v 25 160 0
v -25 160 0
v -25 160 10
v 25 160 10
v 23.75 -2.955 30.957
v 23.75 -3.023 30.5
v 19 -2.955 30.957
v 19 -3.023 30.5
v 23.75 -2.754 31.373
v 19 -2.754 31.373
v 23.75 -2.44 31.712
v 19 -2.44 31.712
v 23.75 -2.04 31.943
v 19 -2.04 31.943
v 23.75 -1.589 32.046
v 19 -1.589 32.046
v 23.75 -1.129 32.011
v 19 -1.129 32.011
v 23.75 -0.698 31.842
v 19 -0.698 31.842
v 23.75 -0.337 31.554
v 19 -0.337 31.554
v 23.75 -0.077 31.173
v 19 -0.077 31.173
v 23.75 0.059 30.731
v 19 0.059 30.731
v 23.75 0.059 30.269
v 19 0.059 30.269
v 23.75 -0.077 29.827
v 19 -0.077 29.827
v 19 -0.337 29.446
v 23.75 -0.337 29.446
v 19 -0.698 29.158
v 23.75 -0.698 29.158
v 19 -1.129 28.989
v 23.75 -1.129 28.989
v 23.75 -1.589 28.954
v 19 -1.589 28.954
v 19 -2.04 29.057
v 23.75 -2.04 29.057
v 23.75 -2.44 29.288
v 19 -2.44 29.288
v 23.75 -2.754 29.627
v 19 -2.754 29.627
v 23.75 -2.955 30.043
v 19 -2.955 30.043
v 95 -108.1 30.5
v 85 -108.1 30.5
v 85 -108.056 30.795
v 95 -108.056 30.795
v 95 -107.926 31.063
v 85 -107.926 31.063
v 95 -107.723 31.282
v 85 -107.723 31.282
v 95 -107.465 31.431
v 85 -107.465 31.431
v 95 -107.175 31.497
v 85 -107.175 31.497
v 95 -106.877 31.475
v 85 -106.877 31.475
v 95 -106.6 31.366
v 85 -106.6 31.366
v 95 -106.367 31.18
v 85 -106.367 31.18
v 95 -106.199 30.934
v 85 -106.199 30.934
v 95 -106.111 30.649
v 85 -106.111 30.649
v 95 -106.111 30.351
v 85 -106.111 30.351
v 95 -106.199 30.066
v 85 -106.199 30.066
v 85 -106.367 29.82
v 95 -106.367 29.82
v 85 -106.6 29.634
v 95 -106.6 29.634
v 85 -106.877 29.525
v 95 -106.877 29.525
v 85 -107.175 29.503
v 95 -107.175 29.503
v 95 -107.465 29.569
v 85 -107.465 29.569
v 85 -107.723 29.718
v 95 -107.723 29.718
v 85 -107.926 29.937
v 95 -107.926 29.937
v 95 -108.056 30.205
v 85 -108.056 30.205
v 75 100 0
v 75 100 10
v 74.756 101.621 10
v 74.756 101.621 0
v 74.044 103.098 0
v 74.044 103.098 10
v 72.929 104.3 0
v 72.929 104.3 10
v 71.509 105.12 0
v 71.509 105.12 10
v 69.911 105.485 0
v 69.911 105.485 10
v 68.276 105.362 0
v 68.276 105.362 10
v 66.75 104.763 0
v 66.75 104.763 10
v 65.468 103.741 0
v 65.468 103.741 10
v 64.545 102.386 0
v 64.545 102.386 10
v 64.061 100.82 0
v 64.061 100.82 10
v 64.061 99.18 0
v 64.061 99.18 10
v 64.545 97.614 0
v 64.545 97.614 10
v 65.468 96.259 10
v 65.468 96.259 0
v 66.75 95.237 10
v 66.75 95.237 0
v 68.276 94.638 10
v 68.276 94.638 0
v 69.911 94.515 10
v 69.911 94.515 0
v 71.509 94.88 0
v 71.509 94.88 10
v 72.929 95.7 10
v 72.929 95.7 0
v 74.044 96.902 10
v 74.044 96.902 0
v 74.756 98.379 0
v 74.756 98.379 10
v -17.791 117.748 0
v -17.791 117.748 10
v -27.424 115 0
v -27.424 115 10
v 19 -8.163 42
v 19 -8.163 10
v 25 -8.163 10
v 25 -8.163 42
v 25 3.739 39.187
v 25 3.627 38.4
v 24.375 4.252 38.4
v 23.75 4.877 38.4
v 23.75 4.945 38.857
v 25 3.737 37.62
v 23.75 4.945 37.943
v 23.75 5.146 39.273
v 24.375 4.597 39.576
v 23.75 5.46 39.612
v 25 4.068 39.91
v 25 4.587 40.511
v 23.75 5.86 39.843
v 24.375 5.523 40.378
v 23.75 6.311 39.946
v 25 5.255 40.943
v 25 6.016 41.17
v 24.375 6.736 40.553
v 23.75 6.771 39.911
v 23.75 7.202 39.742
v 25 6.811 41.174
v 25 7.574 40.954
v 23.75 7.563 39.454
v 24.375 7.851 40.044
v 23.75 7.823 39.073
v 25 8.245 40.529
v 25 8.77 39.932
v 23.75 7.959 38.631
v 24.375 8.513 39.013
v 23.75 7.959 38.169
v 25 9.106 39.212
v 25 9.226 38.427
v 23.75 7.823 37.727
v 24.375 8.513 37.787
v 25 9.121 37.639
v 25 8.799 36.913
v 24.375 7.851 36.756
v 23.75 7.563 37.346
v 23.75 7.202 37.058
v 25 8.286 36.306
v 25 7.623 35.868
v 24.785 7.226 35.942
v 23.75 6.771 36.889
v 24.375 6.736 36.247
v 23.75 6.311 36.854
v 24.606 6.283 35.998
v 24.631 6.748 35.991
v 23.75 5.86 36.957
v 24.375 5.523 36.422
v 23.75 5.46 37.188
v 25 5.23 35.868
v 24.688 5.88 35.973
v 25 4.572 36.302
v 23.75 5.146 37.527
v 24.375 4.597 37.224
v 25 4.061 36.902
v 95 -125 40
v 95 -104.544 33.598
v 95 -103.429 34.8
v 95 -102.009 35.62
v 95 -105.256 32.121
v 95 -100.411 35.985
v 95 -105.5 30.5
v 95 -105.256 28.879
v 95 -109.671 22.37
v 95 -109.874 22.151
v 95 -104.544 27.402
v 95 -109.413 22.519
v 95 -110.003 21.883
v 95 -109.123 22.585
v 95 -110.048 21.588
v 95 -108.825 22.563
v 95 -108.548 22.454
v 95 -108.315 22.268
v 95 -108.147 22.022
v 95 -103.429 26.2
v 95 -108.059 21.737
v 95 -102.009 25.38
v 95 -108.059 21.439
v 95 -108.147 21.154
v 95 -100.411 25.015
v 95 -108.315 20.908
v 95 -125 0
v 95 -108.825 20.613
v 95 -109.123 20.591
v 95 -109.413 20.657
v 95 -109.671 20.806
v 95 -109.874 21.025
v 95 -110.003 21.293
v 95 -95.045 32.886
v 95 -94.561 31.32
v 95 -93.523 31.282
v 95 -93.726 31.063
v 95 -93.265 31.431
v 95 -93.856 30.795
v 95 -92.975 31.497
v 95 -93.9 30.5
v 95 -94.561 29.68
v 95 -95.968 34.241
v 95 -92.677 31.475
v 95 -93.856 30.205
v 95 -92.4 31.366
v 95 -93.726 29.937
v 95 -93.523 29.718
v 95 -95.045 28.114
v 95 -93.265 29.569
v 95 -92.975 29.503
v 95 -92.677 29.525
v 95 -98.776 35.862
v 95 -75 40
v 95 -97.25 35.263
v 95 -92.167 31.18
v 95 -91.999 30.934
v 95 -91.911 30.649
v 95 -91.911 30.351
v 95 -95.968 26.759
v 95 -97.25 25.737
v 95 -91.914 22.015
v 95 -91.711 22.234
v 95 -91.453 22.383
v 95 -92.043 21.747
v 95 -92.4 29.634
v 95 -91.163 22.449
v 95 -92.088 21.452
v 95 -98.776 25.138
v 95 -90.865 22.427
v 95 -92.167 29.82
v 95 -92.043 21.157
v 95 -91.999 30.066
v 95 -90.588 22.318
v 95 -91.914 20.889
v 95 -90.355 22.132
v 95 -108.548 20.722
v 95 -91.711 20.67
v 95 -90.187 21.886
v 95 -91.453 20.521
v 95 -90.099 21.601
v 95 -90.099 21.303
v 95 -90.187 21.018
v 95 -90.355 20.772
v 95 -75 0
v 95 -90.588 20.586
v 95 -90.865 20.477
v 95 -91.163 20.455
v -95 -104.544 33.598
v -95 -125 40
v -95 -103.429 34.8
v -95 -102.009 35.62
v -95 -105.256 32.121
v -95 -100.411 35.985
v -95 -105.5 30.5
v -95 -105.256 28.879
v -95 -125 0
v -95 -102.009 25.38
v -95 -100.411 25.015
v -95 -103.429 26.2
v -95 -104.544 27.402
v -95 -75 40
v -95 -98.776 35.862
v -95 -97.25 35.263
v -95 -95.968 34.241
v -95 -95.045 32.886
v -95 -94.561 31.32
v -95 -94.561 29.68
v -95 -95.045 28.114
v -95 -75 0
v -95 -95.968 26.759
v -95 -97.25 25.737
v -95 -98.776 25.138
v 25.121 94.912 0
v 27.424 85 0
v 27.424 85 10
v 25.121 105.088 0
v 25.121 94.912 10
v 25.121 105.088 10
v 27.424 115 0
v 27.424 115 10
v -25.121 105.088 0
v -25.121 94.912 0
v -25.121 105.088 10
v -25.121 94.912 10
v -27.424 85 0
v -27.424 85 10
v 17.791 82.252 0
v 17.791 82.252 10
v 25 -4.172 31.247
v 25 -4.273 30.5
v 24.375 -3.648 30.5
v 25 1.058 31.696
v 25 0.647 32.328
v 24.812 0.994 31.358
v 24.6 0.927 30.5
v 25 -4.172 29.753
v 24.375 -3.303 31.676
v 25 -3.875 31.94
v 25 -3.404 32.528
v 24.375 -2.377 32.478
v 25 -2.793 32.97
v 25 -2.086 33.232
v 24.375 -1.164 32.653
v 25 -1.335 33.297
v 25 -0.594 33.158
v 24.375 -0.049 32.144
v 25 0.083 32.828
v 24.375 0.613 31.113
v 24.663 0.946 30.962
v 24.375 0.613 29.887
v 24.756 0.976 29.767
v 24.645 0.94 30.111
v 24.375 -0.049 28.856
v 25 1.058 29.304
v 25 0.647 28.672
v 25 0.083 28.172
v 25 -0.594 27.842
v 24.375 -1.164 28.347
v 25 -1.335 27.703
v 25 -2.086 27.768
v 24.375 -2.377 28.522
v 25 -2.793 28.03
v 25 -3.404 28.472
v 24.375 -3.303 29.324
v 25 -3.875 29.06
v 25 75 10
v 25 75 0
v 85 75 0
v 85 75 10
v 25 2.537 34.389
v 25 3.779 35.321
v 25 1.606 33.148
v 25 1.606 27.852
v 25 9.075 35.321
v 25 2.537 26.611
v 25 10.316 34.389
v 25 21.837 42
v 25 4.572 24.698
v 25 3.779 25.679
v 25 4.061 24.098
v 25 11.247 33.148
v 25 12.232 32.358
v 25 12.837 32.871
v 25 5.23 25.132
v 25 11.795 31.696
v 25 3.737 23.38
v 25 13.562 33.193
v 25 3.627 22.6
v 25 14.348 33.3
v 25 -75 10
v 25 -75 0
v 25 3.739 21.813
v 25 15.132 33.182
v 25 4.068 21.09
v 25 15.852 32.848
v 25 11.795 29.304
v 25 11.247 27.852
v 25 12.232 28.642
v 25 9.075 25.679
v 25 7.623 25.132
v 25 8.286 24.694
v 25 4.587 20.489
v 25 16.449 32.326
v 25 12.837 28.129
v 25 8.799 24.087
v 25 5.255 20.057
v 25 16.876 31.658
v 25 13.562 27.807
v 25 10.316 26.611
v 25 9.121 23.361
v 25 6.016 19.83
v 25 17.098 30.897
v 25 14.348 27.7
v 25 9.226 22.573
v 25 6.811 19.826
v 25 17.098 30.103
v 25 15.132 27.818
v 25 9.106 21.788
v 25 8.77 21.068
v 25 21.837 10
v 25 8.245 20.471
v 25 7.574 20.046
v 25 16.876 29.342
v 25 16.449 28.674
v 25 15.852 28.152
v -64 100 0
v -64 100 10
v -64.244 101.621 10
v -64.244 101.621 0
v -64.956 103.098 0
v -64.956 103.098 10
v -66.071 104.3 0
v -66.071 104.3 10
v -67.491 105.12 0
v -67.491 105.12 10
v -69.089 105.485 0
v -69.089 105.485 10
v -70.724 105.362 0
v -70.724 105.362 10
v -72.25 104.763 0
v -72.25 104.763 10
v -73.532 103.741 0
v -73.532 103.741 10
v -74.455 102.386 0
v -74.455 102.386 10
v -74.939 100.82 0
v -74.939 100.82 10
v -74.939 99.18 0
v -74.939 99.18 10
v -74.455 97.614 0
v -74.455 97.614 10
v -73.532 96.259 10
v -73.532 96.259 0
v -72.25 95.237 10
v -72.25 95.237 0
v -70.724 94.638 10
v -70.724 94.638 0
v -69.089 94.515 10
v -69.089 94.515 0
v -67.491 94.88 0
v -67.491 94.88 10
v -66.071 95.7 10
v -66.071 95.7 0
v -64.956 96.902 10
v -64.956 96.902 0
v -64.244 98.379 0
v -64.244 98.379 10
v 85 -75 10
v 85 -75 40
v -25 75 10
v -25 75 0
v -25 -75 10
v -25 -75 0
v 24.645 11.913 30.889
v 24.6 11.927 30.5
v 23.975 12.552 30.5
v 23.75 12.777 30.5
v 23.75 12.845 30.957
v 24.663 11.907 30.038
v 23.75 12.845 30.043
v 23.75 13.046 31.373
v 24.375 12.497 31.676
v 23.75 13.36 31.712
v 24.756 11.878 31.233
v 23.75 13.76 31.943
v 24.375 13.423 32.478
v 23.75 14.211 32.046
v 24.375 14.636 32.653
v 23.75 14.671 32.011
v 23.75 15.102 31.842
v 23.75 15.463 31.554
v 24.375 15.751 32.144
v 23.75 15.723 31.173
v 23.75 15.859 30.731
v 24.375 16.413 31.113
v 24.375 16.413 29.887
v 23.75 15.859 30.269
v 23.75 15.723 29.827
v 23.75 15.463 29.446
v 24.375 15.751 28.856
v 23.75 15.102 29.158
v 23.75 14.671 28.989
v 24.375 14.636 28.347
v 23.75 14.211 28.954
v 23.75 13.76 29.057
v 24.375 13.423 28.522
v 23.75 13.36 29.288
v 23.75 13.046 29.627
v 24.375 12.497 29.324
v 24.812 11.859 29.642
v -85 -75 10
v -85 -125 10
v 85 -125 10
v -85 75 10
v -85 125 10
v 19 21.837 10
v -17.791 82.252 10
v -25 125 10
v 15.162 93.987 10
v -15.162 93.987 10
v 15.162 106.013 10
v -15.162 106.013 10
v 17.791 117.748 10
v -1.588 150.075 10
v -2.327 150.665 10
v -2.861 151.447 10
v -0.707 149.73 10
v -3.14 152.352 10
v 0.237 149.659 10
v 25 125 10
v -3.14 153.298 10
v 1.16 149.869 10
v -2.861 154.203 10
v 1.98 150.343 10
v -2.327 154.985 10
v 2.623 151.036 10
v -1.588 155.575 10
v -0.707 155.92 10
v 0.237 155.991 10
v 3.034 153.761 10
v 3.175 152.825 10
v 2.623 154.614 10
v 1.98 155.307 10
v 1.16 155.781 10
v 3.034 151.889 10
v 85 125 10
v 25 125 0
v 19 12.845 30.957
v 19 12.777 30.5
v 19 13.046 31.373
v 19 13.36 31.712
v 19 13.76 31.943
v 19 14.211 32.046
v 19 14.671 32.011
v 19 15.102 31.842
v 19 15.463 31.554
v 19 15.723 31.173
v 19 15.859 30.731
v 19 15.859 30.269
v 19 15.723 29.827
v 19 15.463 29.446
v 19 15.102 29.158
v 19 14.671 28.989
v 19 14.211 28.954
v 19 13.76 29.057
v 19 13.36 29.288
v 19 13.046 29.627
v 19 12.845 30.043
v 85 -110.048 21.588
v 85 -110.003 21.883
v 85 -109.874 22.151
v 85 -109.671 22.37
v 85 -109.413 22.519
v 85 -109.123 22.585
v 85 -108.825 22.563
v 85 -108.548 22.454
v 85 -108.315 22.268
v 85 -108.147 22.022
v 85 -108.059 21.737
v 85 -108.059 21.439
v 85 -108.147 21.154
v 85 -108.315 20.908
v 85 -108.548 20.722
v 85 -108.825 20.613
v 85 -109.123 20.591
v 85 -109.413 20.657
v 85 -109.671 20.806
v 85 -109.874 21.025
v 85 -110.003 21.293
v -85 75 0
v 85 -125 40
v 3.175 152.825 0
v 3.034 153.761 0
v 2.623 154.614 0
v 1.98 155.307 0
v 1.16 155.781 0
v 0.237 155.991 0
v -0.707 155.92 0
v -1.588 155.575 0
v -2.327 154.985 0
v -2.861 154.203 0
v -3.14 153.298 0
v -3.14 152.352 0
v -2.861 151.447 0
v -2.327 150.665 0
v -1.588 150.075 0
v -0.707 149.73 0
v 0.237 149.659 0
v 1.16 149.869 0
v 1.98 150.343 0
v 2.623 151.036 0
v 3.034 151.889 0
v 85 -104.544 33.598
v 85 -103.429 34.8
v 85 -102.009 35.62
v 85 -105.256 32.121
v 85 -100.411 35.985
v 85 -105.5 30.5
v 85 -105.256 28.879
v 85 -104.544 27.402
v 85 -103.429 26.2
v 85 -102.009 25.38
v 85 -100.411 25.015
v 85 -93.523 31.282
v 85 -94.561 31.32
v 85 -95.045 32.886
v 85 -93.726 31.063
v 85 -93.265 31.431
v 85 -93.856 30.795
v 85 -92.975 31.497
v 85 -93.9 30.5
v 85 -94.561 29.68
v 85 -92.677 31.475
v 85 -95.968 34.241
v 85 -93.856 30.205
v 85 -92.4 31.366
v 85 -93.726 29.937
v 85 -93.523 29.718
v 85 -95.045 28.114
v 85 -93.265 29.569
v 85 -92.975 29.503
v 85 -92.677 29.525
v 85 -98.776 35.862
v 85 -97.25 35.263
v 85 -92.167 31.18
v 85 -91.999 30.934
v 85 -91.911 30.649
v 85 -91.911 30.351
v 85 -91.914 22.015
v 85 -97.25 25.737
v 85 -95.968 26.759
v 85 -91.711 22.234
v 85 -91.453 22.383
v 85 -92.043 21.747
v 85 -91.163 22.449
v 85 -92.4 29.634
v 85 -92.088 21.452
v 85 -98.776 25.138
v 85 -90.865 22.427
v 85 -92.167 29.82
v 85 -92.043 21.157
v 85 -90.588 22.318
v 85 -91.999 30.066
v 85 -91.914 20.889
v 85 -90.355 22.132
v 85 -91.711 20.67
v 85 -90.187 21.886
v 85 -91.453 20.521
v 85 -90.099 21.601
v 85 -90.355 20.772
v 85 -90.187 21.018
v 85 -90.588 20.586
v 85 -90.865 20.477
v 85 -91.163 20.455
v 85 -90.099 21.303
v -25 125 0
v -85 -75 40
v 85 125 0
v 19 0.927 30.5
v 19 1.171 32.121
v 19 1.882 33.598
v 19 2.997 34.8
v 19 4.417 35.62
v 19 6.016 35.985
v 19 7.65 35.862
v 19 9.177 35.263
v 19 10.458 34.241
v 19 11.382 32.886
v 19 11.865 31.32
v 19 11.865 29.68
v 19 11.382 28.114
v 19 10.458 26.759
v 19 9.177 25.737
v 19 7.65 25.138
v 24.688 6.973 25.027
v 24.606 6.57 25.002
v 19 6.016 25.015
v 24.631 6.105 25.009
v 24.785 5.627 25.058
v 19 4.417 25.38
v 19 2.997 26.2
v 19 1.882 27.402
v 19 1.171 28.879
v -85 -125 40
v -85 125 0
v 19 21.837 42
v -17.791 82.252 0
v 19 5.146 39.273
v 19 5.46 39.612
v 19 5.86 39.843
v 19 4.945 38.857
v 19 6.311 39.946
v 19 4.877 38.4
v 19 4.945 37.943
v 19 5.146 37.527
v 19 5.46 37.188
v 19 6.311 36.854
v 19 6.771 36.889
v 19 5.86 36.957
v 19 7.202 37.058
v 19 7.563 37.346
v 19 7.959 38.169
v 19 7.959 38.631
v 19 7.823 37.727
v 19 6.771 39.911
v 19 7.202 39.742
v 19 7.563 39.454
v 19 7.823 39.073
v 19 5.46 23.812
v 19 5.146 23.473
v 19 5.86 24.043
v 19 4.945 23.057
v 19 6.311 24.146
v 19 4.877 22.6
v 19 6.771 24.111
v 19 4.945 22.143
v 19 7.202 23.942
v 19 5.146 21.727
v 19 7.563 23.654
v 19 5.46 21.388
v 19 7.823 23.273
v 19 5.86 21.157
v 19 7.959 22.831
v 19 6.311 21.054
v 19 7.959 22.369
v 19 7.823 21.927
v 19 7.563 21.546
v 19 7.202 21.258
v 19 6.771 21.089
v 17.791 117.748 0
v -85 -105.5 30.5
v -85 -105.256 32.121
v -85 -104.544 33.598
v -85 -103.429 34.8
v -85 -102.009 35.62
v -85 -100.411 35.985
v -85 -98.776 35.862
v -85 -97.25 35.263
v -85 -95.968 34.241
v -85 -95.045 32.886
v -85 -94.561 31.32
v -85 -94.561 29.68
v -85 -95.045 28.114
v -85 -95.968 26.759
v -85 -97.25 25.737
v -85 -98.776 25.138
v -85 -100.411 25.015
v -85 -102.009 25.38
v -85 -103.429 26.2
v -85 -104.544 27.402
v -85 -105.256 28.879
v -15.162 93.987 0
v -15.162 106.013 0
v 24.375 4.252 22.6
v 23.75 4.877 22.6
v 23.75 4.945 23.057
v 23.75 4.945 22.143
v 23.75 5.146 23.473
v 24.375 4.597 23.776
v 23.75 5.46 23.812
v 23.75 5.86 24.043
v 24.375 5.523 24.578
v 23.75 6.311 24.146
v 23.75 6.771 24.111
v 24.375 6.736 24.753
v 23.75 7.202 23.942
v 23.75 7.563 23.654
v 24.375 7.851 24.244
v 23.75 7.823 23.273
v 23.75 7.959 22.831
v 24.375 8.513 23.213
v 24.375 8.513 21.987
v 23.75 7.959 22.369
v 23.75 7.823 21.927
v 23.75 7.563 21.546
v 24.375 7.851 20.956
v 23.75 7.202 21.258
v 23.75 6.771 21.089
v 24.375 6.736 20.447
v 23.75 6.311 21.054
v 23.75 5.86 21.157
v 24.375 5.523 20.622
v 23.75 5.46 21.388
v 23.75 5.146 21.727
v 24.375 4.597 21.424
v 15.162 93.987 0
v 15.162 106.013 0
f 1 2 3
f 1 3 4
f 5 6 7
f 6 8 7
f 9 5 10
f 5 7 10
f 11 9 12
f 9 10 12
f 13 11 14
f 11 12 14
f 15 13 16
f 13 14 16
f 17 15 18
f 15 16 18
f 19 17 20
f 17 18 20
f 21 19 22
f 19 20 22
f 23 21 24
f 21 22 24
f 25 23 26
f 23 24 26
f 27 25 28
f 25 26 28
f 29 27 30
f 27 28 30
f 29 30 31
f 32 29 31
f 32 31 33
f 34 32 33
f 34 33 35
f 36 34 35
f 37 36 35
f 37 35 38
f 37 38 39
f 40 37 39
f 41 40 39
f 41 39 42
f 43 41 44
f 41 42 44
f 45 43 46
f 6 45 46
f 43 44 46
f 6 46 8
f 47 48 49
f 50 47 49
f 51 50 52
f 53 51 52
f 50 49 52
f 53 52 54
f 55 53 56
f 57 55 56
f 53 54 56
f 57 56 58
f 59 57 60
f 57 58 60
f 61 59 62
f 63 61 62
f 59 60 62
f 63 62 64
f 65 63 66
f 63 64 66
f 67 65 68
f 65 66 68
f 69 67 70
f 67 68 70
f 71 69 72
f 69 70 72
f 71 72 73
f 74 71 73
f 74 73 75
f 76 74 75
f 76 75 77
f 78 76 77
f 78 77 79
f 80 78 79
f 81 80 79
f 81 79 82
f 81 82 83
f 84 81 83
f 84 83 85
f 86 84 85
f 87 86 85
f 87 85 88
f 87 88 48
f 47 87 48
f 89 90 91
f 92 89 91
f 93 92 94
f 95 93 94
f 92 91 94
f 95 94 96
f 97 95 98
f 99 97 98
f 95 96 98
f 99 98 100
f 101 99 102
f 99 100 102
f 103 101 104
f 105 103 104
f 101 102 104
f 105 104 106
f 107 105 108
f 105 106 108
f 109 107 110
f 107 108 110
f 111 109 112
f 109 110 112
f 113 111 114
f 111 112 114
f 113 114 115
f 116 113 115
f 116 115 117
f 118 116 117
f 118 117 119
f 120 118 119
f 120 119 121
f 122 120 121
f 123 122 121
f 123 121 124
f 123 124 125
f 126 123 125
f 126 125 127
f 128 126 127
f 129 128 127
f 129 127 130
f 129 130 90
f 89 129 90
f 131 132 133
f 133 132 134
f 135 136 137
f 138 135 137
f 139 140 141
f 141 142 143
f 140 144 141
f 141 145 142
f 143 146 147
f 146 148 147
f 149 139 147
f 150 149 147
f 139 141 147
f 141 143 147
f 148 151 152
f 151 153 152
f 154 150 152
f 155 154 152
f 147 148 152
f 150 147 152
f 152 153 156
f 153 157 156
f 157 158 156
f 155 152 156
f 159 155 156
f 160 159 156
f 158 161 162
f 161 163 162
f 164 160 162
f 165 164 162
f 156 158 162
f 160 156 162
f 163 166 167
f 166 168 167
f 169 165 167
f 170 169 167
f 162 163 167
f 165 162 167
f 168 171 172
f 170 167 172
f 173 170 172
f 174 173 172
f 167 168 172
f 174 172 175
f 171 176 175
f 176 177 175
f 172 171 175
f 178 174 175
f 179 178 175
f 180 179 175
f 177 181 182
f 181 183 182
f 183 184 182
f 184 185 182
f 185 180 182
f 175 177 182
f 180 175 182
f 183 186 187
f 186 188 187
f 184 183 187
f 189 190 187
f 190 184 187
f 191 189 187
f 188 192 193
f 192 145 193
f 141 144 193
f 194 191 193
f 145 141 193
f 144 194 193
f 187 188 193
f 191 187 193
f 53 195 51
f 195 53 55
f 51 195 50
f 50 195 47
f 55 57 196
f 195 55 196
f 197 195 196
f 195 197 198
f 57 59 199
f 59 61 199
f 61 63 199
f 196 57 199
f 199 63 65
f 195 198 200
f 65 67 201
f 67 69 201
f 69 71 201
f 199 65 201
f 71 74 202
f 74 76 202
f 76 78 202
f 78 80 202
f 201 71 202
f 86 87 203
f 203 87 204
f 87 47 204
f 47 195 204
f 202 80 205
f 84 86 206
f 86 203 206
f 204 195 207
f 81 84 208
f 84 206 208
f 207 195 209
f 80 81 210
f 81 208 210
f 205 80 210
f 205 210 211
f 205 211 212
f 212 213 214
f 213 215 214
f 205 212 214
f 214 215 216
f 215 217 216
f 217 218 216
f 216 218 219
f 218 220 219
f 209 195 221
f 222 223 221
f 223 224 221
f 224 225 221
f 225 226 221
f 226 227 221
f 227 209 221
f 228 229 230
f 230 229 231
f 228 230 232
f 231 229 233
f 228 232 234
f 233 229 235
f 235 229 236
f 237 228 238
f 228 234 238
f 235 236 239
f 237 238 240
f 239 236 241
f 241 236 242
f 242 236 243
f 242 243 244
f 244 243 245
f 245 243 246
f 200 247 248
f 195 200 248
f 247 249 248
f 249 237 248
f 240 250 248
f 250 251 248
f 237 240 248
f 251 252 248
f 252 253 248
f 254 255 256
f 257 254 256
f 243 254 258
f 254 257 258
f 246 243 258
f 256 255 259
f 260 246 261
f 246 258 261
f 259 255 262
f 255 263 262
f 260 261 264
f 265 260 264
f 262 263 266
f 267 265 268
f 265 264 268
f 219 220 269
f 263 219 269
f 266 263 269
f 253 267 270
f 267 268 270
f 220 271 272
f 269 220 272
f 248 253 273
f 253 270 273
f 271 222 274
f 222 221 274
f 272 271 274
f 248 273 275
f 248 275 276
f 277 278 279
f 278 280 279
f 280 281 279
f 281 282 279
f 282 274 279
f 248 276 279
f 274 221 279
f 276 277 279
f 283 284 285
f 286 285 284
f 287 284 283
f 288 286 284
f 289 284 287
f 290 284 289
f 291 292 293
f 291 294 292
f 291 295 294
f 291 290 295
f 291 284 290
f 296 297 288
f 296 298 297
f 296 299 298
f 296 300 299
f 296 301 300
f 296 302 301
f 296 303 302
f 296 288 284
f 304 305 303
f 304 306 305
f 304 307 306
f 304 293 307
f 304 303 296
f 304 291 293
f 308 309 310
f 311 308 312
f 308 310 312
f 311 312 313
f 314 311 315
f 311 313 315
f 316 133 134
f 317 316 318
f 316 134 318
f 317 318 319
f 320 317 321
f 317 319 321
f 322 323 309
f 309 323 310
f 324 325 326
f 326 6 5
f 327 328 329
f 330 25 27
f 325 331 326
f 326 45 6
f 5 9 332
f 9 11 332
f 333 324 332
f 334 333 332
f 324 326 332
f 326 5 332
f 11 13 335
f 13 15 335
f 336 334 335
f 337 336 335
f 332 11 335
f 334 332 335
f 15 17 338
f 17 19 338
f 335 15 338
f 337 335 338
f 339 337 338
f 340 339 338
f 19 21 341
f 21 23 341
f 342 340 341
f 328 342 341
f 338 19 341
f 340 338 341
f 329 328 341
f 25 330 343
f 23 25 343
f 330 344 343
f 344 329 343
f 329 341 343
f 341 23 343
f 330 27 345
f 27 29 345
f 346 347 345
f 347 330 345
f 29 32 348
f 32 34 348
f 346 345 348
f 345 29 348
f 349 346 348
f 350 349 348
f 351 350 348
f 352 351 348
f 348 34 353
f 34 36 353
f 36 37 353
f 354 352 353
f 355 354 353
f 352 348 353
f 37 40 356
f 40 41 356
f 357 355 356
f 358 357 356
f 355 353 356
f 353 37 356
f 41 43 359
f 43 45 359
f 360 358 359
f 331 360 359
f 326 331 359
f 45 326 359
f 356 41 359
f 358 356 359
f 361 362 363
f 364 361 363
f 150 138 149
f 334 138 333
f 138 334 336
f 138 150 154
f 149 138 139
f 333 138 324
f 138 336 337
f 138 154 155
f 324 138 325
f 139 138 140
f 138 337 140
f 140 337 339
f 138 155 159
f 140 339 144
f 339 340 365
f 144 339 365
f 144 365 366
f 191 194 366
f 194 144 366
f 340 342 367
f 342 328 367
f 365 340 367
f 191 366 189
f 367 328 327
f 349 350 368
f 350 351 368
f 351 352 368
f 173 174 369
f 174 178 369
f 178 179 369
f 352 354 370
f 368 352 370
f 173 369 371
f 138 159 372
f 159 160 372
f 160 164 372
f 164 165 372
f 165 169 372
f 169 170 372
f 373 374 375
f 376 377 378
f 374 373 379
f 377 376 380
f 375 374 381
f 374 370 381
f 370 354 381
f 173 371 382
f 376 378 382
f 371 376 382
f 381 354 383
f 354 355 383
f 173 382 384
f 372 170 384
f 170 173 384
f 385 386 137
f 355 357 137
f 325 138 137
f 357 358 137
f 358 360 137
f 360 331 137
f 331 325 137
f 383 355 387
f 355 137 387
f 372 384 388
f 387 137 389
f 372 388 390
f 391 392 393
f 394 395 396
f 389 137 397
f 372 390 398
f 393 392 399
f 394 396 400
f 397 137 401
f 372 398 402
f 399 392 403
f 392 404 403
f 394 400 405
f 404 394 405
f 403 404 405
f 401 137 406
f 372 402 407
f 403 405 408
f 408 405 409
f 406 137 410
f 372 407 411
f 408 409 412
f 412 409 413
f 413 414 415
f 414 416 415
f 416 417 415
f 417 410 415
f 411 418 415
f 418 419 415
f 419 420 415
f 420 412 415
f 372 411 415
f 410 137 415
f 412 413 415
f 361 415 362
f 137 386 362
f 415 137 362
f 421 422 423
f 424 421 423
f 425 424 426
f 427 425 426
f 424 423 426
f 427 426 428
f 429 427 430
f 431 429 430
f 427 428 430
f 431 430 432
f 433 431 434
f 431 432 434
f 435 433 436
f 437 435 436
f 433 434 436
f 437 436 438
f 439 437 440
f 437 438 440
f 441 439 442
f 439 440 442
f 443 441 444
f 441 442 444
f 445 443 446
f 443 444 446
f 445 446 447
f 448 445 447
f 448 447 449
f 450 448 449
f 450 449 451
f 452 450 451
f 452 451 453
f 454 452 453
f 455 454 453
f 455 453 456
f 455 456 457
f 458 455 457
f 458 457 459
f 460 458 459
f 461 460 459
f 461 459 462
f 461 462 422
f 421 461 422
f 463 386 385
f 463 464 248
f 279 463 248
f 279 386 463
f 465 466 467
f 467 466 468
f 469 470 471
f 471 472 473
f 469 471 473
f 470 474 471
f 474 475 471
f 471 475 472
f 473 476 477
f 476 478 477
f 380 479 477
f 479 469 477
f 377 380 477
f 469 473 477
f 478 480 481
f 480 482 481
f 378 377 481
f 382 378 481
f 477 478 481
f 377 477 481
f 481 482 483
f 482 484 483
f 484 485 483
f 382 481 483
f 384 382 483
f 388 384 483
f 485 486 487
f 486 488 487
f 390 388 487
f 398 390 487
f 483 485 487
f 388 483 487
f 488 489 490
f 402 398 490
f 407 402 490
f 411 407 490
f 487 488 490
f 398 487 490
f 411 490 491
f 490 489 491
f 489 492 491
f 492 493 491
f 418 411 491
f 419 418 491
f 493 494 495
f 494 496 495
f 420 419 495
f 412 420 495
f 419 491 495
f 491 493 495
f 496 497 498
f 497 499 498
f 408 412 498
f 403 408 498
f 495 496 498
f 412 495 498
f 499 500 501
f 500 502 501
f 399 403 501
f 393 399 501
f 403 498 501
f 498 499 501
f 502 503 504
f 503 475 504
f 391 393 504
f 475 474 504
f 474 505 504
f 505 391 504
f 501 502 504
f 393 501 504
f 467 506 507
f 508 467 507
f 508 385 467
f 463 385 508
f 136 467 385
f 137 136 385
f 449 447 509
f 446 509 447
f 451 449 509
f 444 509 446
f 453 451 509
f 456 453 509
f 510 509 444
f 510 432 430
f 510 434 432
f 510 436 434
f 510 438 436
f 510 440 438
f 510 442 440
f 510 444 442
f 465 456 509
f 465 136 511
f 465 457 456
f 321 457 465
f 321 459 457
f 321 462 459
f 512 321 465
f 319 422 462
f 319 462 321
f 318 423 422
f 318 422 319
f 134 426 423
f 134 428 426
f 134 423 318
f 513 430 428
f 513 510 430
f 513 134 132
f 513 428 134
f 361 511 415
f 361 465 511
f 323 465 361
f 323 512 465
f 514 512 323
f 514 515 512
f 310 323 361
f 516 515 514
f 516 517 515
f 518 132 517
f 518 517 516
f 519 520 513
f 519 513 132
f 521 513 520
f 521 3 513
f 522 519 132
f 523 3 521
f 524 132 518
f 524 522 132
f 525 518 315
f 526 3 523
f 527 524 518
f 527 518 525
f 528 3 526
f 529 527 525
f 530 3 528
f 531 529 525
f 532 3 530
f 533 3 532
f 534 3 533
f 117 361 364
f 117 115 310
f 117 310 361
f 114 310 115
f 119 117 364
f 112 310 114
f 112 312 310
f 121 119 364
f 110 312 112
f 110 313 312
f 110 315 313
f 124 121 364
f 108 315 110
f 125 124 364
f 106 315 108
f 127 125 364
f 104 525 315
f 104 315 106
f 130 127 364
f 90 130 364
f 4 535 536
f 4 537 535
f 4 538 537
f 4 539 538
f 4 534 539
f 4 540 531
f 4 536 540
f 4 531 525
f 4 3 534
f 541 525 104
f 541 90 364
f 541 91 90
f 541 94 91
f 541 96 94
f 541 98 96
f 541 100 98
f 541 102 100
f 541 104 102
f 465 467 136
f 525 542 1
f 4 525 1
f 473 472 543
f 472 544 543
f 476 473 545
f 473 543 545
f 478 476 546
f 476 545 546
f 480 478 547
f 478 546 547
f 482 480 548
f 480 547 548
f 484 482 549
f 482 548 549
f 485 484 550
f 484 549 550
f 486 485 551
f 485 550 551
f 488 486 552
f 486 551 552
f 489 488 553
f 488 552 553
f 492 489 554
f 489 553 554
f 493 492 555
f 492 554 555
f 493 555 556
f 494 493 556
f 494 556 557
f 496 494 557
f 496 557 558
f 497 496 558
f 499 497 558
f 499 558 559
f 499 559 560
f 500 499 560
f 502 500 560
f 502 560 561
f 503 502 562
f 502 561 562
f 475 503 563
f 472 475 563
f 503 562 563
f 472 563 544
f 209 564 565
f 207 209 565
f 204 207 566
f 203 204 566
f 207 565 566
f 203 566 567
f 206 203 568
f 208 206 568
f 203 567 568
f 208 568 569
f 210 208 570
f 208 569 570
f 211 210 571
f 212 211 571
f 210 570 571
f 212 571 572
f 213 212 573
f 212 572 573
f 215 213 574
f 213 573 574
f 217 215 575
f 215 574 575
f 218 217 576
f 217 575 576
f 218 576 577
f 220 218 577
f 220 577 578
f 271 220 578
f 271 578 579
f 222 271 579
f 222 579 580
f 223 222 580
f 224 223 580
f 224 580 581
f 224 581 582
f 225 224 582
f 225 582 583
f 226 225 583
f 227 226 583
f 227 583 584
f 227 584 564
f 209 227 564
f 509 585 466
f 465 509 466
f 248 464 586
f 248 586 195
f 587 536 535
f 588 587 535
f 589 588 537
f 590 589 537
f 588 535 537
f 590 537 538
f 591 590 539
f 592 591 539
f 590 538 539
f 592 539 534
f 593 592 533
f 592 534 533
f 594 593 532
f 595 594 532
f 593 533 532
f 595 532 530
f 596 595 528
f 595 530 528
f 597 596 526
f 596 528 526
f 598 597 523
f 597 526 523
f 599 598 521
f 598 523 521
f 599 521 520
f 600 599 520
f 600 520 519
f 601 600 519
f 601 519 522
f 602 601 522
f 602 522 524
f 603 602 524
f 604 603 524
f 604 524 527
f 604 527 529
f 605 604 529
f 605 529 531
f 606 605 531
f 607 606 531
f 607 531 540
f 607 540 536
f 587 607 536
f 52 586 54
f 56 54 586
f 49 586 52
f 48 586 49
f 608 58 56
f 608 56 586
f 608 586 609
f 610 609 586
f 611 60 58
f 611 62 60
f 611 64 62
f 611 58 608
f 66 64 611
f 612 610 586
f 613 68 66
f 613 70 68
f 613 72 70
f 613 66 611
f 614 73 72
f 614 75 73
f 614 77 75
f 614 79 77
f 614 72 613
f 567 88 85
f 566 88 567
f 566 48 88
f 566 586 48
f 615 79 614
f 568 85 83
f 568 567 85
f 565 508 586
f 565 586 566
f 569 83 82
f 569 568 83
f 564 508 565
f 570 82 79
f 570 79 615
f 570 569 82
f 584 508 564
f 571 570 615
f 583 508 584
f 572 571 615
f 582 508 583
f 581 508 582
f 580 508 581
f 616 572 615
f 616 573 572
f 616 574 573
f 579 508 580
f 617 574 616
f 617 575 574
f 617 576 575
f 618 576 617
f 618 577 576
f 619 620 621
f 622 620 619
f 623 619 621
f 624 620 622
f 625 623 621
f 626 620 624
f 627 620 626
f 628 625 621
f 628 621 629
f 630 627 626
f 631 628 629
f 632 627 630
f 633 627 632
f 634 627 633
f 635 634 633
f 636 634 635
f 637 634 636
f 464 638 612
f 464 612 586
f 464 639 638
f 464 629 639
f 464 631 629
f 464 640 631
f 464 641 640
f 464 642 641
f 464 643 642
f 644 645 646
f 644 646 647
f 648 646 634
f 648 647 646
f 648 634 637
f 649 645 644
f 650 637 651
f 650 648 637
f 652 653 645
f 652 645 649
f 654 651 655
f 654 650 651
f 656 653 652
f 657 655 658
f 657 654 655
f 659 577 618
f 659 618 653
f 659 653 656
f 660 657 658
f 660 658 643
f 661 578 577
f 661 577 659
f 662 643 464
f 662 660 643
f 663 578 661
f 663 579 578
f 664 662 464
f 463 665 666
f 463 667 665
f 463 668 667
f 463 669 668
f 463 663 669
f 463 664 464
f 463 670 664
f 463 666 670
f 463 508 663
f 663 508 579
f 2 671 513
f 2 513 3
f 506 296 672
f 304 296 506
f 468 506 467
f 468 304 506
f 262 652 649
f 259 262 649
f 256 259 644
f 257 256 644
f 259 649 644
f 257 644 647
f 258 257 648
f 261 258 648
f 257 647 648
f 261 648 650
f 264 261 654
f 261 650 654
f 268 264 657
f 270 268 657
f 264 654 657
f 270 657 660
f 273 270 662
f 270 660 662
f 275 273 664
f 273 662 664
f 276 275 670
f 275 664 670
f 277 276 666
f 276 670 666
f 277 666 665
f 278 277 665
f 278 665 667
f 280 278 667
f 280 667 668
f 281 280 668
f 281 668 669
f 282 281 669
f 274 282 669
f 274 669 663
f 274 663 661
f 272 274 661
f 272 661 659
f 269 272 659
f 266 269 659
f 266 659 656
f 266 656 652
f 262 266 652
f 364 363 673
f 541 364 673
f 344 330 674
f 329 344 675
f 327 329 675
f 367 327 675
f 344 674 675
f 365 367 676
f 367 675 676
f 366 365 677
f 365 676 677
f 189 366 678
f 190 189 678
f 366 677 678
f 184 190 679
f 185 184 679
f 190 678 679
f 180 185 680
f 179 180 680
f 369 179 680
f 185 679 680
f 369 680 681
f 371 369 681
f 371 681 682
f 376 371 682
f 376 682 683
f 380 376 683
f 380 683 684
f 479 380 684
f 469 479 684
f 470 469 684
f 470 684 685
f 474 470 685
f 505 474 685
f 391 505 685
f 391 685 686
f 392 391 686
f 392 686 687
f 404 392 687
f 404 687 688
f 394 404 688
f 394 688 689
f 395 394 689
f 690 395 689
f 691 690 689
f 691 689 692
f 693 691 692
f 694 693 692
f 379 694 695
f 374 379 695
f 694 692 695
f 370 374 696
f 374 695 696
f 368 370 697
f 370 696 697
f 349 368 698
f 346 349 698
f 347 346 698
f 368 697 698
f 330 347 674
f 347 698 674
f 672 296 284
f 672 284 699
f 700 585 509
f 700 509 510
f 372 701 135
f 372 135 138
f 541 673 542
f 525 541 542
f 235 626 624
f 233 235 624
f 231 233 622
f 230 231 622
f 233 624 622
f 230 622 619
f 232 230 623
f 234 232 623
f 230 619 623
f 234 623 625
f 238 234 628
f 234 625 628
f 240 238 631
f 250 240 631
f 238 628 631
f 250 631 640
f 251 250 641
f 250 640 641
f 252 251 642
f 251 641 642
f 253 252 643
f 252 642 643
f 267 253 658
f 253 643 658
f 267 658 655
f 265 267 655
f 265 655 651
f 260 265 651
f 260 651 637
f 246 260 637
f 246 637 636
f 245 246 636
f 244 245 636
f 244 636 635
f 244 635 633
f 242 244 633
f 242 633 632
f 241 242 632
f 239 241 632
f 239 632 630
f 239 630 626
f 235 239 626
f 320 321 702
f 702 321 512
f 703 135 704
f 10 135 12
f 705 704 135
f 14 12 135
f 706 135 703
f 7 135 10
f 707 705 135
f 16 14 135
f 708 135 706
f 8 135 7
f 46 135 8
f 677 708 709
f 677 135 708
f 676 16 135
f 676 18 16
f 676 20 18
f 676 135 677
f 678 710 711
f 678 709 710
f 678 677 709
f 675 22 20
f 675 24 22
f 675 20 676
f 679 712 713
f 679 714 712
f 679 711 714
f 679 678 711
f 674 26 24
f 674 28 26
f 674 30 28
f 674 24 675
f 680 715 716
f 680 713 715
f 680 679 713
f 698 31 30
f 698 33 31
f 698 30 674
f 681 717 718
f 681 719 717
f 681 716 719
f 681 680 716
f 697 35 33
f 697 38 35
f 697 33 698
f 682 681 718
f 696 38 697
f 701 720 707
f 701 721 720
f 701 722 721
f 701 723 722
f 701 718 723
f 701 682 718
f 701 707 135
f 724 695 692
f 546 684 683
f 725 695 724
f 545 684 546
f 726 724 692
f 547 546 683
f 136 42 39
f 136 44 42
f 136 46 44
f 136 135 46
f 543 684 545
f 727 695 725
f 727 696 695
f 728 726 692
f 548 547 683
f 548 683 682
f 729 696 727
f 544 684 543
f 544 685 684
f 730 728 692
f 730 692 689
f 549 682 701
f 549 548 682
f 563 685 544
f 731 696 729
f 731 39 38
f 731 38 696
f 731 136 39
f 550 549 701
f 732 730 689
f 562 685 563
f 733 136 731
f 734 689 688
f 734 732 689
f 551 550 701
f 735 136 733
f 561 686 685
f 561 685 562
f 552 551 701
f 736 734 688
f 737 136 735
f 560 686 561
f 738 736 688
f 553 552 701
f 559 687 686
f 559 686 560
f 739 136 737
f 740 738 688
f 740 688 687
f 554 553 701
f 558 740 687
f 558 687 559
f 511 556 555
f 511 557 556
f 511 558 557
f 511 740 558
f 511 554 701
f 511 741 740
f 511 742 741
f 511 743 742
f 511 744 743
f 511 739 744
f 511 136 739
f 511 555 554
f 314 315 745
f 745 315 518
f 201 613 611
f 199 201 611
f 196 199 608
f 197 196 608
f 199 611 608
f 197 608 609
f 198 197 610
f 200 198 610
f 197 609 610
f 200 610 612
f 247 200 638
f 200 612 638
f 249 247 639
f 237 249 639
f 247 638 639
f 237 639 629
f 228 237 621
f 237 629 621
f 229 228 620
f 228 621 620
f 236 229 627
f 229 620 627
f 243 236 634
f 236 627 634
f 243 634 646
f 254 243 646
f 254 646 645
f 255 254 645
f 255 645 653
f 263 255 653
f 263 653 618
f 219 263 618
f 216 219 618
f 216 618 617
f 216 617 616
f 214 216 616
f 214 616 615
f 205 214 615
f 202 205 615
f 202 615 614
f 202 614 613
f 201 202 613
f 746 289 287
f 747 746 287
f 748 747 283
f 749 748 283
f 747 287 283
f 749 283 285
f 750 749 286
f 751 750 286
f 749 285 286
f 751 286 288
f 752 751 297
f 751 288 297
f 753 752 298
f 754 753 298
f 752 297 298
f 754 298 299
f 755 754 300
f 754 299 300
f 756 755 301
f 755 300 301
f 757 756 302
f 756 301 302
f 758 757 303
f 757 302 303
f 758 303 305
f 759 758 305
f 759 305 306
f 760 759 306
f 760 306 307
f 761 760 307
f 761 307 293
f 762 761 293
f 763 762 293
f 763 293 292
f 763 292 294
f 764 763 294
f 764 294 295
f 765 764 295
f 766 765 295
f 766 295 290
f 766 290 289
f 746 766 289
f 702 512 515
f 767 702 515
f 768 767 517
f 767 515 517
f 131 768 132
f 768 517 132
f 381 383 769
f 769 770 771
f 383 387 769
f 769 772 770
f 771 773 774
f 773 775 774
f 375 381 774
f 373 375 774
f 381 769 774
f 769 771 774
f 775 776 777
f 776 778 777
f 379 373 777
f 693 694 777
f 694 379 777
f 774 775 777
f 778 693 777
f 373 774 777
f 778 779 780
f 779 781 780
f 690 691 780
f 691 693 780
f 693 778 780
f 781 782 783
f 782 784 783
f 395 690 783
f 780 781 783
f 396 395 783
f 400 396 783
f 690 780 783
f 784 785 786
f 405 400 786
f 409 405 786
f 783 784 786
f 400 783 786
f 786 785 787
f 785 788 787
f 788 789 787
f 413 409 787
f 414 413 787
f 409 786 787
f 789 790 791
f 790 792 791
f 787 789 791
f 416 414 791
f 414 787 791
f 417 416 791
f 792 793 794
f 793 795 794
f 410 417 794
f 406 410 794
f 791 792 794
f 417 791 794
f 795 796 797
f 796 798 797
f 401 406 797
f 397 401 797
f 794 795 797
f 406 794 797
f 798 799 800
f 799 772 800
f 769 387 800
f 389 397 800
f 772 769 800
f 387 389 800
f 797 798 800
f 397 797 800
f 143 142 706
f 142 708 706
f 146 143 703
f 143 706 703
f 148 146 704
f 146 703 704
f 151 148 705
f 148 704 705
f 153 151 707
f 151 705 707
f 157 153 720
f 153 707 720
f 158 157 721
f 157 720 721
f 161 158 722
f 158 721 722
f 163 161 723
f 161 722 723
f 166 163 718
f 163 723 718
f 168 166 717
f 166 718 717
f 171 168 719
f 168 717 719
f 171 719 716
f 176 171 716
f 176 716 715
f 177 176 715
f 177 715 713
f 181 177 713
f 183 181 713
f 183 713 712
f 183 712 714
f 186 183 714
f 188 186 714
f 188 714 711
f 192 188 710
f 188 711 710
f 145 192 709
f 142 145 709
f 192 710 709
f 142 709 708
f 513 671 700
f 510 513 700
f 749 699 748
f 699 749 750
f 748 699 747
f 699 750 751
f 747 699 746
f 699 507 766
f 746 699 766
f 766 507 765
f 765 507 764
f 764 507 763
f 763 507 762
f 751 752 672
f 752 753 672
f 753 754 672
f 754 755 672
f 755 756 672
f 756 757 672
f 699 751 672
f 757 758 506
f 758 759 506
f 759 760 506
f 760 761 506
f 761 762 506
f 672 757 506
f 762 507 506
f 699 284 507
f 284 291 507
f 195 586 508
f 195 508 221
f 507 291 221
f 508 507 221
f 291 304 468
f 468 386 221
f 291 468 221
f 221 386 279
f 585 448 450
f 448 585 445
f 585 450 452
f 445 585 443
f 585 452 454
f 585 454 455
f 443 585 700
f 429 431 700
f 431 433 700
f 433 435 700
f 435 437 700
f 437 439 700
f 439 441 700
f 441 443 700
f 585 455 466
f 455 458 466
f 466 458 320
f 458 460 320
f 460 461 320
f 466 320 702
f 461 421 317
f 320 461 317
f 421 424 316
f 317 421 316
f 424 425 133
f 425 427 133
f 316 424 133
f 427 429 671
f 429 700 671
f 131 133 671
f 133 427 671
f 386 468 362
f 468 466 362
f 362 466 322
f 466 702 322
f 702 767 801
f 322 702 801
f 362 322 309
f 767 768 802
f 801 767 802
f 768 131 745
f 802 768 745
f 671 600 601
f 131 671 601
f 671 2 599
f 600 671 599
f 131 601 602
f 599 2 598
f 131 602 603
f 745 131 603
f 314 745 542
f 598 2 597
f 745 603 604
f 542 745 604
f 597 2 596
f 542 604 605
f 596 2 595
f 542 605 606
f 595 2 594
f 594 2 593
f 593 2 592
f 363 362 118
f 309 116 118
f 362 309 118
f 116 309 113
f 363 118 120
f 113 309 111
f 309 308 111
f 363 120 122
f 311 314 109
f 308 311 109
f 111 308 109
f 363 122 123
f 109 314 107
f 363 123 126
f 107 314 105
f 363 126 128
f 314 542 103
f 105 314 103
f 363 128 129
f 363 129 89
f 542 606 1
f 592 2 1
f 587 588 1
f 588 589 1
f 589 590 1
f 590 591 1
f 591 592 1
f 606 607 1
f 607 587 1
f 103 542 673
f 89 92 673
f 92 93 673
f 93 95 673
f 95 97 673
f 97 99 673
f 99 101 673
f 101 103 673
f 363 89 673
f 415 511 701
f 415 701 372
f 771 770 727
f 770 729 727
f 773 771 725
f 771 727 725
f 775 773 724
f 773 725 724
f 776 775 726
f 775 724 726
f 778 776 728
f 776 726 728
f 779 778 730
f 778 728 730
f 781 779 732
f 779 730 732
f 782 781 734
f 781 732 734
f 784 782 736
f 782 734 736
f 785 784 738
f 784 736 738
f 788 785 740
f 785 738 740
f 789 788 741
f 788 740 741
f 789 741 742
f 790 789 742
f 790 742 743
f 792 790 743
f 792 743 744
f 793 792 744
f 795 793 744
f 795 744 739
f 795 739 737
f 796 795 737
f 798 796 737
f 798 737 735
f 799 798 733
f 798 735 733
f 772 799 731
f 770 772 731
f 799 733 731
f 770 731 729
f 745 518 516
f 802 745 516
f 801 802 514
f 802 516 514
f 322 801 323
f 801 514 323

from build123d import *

# Parameters (mm, degrees)
F0_W            = 50
F0_H            = 150
F0_H_2          = 50
F0_W_2          = 60
F0_W_3          = 70
F0_H_3          = 35
F1_DEPTH        = 10
F2_W            = 10
F2_H            = 50
F3_DEPTH        = 30
F4_R            = 5.5
F5_DEPTH        = 190.001
F6_R            = 3.175
F7_DEPTH        = 10.001
F8_R            = 5.5
F9_DEPTH        = 10.001
F10_R           = 5.5
F11_DEPTH       = 10.001
F13_DEPTH       = 10.001
F14_W           = 6
F14_H           = 30
F15_DEPTH       = 32
F16_R           = 5.5
F17_DEPTH       = 76.001
F19_D           = 3.1
F19_CSINK_D     = 5.6
F19_CSINK_ANGLE = 90
F21_D           = 2
F21_DEPTH       = 30
F21_TIP         = 0.600860619


with BuildPart() as f1:
    # F0 (on Top) → F1 (new body)
    with BuildSketch(Plane.XY):
        Rectangle(F0_W, F0_H)
        with Locations((0, 100)):
            Rectangle(F0_W, F0_H_2)
        with Locations((55, 100)):
            Rectangle(F0_W_2, F0_H_2)
        with Locations((-55, 100)):
            Rectangle(F0_W_2, F0_H_2)
        with Locations((0, -100)):
            Rectangle(F0_W, F0_H_2)
        with Locations((60, -100)):
            Rectangle(F0_W_3, F0_H_2)
        with Locations((0, 142.5)):
            Rectangle(F0_W, F0_H_3)
        with Locations((-60, -100)):
            Rectangle(F0_W_3, F0_H_2)
    extrude(amount=F1_DEPTH)

    # F2 (on face) → F3 (join)
    with BuildSketch(Plane.XY.offset(10)):
        with Locations((-90, -100)):
            Rectangle(F2_W, F2_H)
        with Locations((90, -100)):
            Rectangle(F2_W, F2_H)
    extrude(amount=F3_DEPTH)

    # F4 (on face) → F5 (cut, through all)
    with BuildSketch(Plane(origin=(-95, 0, 0), x_dir=(0, -1, 0), z_dir=(-1, 0, 0))):
        with Locations((100, 30.5)):
            Circle(F4_R)
    extrude(amount=-F5_DEPTH, mode=Mode.SUBTRACT)

    # F6 (on face) → F7 (cut, through all)
    with BuildSketch(Plane.XY.offset(10)):
        with Locations((0, 152.825)):
            Circle(F6_R)
    extrude(amount=-F7_DEPTH, mode=Mode.SUBTRACT)

    # F8 (on face) → F9 (cut, through all)
    with BuildSketch(Plane.XY.offset(10)):
        with Locations((-69.5, 100)):
            Circle(F8_R)
    extrude(amount=-F9_DEPTH, mode=Mode.SUBTRACT)

    # F10 (on face) → F11 (cut, through all)
    with BuildSketch(Plane.XY.offset(10)):
        with Locations((69.5, 100)):
            Circle(F10_R)
    extrude(amount=-F11_DEPTH, mode=Mode.SUBTRACT)

    # F12 (on face) → F13 (cut, through all)
    with BuildSketch(Plane.XY.offset(10)):
        with BuildLine():
            Line((17.7911710483, 82.2515942001), (27.4237727452, 85))
            ThreePointArc((27.4237727452, 85), (24.83, 100), (27.4237727452, 115))
            Line((27.4237727452, 115), (17.7911710483, 117.7484057999))
            ThreePointArc((17.7911710483, 117.7484057999), (14.83, 100), (17.7911710483, 82.2515942001))
        make_face()
        with BuildLine():
            Line((-27.4237727452, 85), (-17.7911710483, 82.2515942001))
            ThreePointArc((-17.7911710483, 82.2515942001), (-14.83, 100), (-17.7911710483, 117.7484057999))
            Line((-17.7911710483, 117.7484057999), (-27.4237727452, 115))
            ThreePointArc((-27.4237727452, 115), (-24.83, 100), (-27.4237727452, 85))
        make_face()
    extrude(amount=-F13_DEPTH, mode=Mode.SUBTRACT)

    # F14 (on face) → F15 (join)
    with BuildSketch(Plane.XY.offset(10)):
        with Locations((22, 6.836565081)):
            Rectangle(F14_W, F14_H)
    extrude(amount=F15_DEPTH)

    # F16 (on face) → F17 (cut, through all)
    with BuildSketch(Plane(origin=(19, 0, 0), x_dir=(0, -1, 0), z_dir=(-1, 0, 0))):
        with Locations((-6.426565081, 30.5)):
            Circle(F16_R)
    extrude(amount=-F17_DEPTH, mode=Mode.SUBTRACT)

    # F19 (through all)
    with Locations(Plane.YZ.offset(25)):
        with Locations((6.426565081, 38.4), (14.326565081, 30.5), (6.426565081, 22.6), (-1.473434919, 30.5)):
            CounterSinkHole(F19_D / 2, F19_CSINK_D / 2, counter_sink_angle=F19_CSINK_ANGLE)

    # F21
    with Locations(Plane.YZ.offset(95)):
        with Locations((-107.1, 30.5), (-92.9, 30.5), (-91.0878232998, 21.4521767002), (-109.0478232998, 21.5878232998)):
            Hole(F21_D / 2, depth=F21_DEPTH)
            with Locations((0, 0, -(F21_DEPTH + F21_TIP / 2))):  # 118° drill point
                Cone(0, F21_D / 2, F21_TIP, mode=Mode.SUBTRACT)


solid = f1.part
